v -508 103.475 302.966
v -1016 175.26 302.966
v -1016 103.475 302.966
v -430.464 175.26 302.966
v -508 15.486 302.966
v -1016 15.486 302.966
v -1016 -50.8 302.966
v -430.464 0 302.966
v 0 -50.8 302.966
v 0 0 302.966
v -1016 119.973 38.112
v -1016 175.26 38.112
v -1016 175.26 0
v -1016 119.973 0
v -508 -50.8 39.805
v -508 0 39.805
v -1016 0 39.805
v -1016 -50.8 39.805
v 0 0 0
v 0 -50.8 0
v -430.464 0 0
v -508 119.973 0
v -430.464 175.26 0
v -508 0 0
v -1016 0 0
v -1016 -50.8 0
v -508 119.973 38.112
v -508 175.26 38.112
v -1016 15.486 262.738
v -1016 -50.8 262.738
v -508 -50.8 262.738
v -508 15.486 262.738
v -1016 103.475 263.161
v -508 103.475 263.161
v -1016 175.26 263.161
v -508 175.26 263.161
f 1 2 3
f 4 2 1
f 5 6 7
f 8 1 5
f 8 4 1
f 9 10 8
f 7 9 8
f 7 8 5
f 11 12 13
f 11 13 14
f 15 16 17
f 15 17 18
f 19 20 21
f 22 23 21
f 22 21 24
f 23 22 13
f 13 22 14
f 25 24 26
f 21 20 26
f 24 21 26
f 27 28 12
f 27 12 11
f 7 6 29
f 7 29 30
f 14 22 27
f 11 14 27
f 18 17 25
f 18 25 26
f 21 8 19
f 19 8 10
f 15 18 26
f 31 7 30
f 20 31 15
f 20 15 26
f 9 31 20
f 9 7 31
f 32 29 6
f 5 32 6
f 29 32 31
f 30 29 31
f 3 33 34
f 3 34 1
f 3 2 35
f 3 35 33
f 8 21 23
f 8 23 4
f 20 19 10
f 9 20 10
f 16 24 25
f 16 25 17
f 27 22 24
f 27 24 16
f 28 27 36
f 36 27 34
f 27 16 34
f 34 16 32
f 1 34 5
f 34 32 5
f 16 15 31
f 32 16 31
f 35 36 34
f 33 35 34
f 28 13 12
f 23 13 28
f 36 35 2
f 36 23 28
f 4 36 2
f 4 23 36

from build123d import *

# Parameters (mm, degrees)
F0_W     = 508
F0_H     = 302.9659508712
F1_DEPTH = 50.8
F2_W     = 77.5359706879
F2_H     = 302.9659508712
F3_DEPTH = 175.26
F4_W     = 71.7851296759
F4_H     = 39.8045896537
F4_W_2   = 50.8
F4_H_2   = 39.8045703769
F4_W_3   = 55.2871824002
F4_H_3   = 38.1124727428
F4_W_4   = 66.2858231544
F4_H_4   = 40.2276038176
F5_DEPTH = 508


with BuildPart() as f1:
    # F0 (on Front) → F1 (new body)
    with BuildSketch(Plane.XZ):
        with Locations((-254, 151.4829754356)):
            Rectangle(F0_W, F0_H)
    extrude(amount=F1_DEPTH)

    # F2 (on face) → F3 (join)
    with BuildSketch(Plane(origin=(0, 0, 0), x_dir=(-1, 0, 0), z_dir=(0, 1, 0))):
        with Locations((469.2320146561, 151.4829754356)):
            Rectangle(F2_W, F2_H)
    extrude(amount=F3_DEPTH)

    # F4 (on face) → F5 (join)
    with BuildSketch(Plane(origin=(-508, 0, 0), x_dir=(0, -1, 0), z_dir=(-1, 0, 0))):
        with Locations((-139.3674351621, 283.0636560443)):
            Rectangle(F4_W, F4_H)
        with Locations((25.4, 19.9022851884)):
            Rectangle(F4_W_2, F4_H_2)
        with Locations((-147.6164087999, 19.0562363714)):
            Rectangle(F4_W_3, F4_H_3)
        with Locations((17.6570884228, 282.8521489623)):
            Rectangle(F4_W_4, F4_H_4)
    extrude(amount=F5_DEPTH)


solid = f1.part
